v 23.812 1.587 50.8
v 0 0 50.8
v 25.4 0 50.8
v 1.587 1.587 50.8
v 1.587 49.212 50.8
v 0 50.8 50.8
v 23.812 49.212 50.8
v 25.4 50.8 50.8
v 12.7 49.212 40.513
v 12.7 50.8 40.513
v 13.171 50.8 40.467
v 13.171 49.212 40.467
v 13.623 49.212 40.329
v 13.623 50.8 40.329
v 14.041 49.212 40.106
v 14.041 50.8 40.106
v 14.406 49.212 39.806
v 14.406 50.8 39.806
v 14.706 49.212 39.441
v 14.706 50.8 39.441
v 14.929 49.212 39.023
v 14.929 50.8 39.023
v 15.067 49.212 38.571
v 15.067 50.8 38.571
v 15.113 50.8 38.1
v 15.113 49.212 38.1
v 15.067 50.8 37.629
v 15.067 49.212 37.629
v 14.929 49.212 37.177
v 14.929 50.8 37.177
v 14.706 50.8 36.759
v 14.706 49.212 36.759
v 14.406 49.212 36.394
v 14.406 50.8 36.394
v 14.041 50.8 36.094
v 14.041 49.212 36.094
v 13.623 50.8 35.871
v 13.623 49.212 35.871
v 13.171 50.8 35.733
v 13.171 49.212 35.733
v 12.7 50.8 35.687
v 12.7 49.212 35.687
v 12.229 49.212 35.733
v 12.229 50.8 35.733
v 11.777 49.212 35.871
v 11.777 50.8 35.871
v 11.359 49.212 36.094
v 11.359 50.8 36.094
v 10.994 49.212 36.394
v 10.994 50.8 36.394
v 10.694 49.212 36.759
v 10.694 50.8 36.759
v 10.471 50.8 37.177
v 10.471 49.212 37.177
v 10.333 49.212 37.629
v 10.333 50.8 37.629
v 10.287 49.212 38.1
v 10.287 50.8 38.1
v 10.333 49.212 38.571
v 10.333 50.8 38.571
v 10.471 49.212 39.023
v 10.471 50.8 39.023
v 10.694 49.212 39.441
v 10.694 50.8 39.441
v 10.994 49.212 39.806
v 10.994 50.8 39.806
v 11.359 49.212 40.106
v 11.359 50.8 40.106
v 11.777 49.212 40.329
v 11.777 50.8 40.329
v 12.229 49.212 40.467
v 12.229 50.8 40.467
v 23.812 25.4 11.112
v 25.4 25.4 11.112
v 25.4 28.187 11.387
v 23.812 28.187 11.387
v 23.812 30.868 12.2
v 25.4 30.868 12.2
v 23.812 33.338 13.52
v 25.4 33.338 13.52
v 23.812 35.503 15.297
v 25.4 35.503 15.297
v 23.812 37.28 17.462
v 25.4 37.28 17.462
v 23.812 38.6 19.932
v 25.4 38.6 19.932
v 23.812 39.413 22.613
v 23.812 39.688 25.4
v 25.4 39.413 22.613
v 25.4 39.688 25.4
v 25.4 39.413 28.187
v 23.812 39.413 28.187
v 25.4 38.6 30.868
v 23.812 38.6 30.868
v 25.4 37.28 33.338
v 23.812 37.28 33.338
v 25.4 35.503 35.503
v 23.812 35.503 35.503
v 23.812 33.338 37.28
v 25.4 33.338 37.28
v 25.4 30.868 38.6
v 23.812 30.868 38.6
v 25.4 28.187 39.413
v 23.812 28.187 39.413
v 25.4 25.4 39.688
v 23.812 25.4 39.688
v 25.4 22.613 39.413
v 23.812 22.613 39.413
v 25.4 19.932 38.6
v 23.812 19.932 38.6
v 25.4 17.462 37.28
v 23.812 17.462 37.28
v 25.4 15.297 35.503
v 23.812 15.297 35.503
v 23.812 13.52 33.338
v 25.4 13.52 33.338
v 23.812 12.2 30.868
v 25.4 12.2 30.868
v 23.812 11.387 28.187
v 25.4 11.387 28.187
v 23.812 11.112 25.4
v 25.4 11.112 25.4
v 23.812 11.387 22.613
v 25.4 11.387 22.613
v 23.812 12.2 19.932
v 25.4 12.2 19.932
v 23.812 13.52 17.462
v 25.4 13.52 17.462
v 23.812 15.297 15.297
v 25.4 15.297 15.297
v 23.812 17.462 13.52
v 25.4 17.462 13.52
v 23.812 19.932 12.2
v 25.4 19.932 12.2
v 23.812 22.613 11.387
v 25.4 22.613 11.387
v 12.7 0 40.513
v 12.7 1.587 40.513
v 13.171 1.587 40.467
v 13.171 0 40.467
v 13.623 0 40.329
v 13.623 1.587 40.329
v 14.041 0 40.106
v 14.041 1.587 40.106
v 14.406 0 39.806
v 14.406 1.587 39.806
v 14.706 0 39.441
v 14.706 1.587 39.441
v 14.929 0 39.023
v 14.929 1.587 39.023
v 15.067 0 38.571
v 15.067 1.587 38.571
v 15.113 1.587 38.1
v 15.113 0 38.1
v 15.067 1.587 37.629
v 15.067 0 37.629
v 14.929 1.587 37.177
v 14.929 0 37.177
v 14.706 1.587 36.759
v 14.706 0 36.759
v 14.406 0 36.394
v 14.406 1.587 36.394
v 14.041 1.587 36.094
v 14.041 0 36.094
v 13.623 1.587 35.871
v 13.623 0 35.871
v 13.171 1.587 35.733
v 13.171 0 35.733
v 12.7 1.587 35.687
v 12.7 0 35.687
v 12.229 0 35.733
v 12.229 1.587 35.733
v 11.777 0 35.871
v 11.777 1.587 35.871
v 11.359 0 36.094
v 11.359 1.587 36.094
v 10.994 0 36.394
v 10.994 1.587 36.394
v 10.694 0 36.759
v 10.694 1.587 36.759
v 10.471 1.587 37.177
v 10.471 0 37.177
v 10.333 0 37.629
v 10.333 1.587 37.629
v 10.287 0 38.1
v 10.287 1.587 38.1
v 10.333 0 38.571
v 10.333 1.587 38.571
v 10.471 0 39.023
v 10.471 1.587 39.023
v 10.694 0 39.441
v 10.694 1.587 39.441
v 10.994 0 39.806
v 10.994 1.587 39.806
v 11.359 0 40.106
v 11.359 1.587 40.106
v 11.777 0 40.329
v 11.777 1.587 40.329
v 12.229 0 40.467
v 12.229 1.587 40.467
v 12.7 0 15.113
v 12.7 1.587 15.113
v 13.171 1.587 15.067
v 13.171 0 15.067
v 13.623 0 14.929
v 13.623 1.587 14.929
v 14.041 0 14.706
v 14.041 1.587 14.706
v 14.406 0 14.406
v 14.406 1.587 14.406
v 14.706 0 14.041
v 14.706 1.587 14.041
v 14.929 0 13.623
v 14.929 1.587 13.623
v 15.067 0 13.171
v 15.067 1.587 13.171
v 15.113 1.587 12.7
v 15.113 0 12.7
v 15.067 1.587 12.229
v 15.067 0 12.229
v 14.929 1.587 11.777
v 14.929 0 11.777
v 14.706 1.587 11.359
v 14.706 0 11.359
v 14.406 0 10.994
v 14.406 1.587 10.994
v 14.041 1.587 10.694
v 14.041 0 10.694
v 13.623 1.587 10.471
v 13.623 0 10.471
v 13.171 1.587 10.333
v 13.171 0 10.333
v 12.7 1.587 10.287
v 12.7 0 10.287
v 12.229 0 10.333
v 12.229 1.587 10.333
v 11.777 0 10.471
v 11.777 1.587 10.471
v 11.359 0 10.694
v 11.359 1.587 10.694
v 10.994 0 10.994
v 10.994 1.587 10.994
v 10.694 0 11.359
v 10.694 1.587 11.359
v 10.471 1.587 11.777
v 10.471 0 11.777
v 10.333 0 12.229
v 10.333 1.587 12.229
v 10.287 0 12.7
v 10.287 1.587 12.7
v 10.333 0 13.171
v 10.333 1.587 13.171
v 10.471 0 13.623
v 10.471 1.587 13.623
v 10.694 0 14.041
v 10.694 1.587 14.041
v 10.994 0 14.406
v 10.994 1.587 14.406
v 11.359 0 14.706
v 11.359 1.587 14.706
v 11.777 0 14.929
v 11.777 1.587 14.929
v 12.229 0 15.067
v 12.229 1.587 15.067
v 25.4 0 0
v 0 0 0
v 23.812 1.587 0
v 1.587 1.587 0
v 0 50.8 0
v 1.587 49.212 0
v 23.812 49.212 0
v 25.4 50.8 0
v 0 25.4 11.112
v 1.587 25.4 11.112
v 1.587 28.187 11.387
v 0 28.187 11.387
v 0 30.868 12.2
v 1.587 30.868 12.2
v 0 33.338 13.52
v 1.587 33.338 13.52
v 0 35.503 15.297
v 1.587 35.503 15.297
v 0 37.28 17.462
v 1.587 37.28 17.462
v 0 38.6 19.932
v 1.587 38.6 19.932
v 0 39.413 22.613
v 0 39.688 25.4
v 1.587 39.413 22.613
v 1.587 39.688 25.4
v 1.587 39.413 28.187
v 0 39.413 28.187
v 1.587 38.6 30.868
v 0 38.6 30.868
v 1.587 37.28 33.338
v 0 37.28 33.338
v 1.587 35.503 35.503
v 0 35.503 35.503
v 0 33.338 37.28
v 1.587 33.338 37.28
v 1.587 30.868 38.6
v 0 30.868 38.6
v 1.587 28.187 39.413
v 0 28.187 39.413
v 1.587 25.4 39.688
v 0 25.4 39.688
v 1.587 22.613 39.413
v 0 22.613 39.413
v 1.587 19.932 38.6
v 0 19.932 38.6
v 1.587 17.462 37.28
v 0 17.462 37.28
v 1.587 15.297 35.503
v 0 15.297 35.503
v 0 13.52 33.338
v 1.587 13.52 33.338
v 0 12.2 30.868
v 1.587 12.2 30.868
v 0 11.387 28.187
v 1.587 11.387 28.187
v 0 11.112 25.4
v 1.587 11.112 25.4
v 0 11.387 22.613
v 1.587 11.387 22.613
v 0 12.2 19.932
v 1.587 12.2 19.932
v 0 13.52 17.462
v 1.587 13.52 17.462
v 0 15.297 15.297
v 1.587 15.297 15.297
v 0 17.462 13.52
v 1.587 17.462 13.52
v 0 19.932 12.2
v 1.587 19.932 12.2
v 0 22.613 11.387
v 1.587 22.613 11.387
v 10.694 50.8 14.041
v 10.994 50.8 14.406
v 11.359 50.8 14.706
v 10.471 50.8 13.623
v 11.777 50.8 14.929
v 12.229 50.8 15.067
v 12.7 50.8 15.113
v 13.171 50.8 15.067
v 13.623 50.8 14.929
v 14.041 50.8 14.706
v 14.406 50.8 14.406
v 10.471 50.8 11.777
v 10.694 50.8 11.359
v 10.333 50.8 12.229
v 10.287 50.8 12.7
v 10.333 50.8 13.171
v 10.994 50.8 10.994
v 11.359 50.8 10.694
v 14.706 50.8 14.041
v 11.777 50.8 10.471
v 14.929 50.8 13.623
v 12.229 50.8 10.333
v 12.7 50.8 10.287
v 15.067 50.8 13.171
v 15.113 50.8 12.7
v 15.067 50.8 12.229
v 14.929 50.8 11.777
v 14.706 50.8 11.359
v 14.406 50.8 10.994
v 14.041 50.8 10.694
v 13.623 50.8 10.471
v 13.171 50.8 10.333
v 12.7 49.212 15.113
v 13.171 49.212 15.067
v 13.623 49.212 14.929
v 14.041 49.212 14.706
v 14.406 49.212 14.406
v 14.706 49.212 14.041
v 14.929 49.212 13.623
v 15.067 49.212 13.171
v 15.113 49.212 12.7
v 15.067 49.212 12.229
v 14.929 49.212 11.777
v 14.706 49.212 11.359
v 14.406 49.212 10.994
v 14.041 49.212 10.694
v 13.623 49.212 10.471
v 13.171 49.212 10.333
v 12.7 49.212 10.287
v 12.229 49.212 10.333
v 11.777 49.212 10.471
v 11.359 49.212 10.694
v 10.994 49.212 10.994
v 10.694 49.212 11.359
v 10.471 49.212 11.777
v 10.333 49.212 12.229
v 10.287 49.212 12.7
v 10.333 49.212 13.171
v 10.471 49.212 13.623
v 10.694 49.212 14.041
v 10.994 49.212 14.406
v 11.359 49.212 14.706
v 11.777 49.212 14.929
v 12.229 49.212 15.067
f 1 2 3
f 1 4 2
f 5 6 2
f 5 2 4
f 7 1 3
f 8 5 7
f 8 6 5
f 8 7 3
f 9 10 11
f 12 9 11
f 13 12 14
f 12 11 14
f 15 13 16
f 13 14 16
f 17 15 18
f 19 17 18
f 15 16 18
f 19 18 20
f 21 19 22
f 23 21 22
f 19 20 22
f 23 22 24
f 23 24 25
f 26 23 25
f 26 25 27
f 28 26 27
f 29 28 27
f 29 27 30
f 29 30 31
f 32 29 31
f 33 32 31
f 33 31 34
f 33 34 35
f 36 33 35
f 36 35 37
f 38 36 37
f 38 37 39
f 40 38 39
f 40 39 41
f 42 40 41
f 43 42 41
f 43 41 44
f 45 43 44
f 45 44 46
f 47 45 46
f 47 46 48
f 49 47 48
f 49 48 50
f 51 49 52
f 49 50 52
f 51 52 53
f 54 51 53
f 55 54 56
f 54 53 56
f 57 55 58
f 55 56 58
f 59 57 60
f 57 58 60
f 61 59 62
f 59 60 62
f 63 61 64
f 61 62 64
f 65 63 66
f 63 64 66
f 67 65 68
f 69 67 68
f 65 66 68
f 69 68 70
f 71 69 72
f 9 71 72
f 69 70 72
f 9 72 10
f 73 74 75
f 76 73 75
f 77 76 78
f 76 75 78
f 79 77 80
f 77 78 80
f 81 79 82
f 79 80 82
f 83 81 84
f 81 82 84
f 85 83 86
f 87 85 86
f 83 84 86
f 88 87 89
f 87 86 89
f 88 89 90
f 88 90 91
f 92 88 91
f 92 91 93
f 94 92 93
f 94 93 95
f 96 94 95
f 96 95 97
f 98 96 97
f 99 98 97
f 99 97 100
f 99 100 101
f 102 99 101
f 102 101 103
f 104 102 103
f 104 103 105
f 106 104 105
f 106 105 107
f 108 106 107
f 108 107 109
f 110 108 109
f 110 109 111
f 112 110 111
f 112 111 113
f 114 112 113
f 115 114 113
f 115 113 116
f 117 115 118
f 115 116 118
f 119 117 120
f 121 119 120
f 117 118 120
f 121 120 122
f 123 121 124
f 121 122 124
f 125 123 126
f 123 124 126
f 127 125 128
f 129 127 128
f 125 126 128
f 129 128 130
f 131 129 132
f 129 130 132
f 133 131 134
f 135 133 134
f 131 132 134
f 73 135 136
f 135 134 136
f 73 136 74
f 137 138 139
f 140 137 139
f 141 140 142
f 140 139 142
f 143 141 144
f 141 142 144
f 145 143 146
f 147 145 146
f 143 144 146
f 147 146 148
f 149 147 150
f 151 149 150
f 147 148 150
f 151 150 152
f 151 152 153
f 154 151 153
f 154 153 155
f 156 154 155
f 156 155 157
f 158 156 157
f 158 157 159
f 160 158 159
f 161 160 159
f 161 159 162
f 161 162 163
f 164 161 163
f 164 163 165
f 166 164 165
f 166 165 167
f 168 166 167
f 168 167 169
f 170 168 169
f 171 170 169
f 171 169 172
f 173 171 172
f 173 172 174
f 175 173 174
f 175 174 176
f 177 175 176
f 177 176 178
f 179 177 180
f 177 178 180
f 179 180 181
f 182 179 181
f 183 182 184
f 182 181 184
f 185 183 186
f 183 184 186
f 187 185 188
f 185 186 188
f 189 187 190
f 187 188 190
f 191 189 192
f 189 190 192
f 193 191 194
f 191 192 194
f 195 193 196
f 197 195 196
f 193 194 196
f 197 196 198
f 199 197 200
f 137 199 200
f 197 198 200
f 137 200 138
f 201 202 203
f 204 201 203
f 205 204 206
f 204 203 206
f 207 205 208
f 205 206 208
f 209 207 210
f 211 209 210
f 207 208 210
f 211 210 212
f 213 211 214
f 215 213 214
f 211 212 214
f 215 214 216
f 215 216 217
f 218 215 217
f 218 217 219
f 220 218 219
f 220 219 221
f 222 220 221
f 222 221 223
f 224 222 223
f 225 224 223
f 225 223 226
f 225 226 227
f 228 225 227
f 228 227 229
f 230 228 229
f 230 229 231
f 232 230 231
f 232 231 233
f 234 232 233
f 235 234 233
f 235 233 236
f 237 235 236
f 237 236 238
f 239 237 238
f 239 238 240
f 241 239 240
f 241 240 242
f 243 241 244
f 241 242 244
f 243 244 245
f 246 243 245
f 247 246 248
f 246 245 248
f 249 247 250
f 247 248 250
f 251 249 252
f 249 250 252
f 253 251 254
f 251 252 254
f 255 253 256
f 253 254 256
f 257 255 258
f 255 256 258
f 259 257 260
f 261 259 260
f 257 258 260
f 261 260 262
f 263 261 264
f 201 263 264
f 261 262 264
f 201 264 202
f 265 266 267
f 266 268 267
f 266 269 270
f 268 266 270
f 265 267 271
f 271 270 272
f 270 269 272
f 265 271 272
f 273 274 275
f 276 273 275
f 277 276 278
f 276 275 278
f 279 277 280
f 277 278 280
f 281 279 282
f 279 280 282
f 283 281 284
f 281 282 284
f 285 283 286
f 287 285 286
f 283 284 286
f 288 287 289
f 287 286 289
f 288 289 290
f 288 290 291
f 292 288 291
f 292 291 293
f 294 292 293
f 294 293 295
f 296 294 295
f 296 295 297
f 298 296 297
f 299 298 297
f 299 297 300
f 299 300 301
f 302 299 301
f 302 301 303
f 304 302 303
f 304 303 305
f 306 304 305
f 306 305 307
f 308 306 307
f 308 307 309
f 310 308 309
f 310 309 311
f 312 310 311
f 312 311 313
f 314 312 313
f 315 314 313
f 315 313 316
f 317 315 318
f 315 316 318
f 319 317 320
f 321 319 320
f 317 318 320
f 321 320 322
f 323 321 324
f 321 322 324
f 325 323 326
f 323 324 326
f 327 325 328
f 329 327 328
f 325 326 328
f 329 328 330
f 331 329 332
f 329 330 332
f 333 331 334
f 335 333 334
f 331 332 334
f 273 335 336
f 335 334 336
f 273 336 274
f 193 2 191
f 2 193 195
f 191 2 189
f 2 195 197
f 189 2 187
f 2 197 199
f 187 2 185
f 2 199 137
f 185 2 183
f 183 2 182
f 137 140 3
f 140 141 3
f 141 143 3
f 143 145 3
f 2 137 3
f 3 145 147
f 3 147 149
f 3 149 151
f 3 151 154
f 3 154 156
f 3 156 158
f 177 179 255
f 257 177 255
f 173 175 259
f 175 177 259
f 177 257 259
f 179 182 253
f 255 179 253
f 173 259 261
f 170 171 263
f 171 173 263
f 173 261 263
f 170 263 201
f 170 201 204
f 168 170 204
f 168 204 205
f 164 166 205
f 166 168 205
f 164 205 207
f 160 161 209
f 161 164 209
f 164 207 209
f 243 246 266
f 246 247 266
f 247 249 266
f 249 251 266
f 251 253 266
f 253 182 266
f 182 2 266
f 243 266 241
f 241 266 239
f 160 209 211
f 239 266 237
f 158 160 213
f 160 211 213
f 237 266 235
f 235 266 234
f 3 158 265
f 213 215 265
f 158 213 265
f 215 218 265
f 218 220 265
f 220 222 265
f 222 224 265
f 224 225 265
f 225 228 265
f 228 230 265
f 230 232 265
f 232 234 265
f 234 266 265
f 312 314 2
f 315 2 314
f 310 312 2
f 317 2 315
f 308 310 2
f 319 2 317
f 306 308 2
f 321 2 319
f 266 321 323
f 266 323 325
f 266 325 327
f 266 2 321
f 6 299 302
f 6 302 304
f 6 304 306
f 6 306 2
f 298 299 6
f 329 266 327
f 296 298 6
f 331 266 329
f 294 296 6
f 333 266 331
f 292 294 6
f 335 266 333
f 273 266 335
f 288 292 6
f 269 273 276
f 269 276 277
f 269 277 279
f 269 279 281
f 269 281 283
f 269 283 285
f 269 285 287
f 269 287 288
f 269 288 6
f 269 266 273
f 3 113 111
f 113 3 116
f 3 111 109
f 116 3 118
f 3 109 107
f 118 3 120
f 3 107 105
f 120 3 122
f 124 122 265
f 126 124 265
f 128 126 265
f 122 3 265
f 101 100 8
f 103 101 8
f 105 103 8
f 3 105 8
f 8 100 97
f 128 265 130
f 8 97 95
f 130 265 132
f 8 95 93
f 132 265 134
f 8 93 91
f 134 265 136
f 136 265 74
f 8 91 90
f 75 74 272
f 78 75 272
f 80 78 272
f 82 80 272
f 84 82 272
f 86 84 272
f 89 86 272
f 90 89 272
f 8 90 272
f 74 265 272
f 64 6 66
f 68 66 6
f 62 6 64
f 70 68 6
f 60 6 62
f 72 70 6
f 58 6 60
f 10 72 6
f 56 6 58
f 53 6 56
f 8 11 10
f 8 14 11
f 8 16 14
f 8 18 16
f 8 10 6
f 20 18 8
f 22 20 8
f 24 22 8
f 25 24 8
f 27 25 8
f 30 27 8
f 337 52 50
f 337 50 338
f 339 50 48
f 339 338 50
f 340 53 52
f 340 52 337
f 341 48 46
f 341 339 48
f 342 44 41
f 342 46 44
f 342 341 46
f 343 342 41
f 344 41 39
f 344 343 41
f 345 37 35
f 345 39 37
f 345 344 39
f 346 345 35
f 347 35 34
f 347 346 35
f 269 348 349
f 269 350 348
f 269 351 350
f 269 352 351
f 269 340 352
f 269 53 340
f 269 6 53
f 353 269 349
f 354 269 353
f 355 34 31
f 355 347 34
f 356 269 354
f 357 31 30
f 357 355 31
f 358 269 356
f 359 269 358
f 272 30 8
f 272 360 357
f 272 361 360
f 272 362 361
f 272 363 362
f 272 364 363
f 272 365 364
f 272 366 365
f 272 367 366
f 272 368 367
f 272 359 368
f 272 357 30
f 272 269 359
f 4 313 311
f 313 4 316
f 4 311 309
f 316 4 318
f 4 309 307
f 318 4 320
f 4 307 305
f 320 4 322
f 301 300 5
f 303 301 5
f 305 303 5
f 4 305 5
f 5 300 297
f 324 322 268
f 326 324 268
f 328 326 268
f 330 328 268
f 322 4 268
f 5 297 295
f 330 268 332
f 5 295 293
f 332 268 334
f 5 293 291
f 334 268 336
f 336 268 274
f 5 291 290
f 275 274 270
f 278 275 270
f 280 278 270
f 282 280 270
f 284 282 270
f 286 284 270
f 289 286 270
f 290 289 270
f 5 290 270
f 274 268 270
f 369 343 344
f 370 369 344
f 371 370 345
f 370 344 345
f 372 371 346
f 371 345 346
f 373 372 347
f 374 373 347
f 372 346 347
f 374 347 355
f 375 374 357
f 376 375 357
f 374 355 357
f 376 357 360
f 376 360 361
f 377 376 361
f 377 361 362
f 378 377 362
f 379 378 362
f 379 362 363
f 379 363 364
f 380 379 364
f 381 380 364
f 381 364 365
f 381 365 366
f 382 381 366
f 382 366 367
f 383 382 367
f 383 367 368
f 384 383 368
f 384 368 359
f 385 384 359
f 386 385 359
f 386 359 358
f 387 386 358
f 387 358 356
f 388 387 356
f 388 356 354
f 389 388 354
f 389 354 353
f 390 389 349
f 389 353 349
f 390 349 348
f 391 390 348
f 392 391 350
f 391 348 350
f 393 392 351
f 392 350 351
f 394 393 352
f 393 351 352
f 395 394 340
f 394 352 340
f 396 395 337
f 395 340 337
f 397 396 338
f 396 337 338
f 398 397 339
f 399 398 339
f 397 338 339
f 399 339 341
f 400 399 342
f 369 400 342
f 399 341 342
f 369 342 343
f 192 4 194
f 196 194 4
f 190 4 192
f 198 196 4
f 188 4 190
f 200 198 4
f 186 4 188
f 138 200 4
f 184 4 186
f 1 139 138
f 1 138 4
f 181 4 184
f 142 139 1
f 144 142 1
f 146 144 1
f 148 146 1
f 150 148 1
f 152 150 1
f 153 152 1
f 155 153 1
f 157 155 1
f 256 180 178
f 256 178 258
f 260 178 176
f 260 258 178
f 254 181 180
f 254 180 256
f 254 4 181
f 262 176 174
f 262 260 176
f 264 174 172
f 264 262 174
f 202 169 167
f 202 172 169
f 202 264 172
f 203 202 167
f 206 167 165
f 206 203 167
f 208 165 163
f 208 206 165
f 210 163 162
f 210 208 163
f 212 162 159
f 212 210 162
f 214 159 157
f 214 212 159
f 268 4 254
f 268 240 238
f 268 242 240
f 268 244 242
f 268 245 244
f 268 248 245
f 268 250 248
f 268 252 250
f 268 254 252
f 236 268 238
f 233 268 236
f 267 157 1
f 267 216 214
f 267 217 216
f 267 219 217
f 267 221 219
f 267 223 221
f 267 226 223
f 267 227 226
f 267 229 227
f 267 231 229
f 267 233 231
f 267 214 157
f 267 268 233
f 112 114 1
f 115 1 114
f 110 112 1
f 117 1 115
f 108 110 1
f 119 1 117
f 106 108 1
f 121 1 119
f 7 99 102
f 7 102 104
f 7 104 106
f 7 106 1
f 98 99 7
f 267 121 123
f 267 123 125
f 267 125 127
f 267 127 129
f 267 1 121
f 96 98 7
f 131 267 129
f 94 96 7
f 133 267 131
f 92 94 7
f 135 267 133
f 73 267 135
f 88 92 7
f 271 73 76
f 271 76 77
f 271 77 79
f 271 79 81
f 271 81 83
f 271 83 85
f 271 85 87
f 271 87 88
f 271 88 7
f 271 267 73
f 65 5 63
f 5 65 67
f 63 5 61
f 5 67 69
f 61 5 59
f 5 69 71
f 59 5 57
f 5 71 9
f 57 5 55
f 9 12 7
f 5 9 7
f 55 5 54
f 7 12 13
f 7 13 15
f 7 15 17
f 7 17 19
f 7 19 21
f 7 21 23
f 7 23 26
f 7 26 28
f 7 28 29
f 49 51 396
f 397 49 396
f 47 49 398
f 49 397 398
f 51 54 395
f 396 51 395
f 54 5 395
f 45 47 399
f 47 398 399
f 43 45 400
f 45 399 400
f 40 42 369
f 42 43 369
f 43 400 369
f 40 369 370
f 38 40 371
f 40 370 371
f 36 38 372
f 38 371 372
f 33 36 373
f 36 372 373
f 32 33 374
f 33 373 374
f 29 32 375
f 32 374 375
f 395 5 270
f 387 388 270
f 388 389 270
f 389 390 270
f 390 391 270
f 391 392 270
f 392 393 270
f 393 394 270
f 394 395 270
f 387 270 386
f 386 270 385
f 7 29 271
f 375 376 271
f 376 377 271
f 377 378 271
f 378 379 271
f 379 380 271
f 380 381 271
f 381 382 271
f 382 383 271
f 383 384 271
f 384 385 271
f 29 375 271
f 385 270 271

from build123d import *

# Parameters (mm, degrees)
SKETCH1_W           = 25.4
SKETCH1_H           = 50.8
SKETCH1_W_2         = 22.225
SKETCH1_H_2         = 47.625
BOSS_EXTRUDE1_DEPTH = 50.8
SKETCH2_R           = 2.413
CUT_EXTRUDE1_DEPTH  = 77.2
SKETCH3_R           = 14.2875
CUT_EXTRUDE2_DEPTH  = 77.2


with BuildPart() as part:
    # Sketch1 → Boss-Extrude1 (new body)
    with BuildSketch(Plane.XY):
        with Locations((12.7, 25.4)):
            Rectangle(SKETCH1_W, SKETCH1_H)
        with Locations((12.7, 25.4)):
            Rectangle(SKETCH1_W_2, SKETCH1_H_2, mode=Mode.SUBTRACT)
    extrude(amount=BOSS_EXTRUDE1_DEPTH)

    # Sketch2 → Cut-Extrude1 (cut, through all)
    with BuildSketch(Plane(origin=(0, 50.8, 0), x_dir=(1, 0, 0), z_dir=(0, 1, 0))):
        with Locations(Location((12.7, -12.7, 0), (0, 0, 270))):
            Circle(SKETCH2_R)
        with Locations(Location((12.7, -38.1, 0), (0, 0, 270))):
            Circle(SKETCH2_R)
    extrude(amount=-CUT_EXTRUDE1_DEPTH, mode=Mode.SUBTRACT)

    # Sketch3 → Cut-Extrude2 (cut, through all)
    with BuildSketch(Plane(origin=(25.4, 0, 0), x_dir=(0, 0, -1), z_dir=(1, 0, 0))):
        with Locations((-25.4, 25.4)):
            Circle(SKETCH3_R)
    extrude(amount=-CUT_EXTRUDE2_DEPTH, mode=Mode.SUBTRACT)


solid = part.part
